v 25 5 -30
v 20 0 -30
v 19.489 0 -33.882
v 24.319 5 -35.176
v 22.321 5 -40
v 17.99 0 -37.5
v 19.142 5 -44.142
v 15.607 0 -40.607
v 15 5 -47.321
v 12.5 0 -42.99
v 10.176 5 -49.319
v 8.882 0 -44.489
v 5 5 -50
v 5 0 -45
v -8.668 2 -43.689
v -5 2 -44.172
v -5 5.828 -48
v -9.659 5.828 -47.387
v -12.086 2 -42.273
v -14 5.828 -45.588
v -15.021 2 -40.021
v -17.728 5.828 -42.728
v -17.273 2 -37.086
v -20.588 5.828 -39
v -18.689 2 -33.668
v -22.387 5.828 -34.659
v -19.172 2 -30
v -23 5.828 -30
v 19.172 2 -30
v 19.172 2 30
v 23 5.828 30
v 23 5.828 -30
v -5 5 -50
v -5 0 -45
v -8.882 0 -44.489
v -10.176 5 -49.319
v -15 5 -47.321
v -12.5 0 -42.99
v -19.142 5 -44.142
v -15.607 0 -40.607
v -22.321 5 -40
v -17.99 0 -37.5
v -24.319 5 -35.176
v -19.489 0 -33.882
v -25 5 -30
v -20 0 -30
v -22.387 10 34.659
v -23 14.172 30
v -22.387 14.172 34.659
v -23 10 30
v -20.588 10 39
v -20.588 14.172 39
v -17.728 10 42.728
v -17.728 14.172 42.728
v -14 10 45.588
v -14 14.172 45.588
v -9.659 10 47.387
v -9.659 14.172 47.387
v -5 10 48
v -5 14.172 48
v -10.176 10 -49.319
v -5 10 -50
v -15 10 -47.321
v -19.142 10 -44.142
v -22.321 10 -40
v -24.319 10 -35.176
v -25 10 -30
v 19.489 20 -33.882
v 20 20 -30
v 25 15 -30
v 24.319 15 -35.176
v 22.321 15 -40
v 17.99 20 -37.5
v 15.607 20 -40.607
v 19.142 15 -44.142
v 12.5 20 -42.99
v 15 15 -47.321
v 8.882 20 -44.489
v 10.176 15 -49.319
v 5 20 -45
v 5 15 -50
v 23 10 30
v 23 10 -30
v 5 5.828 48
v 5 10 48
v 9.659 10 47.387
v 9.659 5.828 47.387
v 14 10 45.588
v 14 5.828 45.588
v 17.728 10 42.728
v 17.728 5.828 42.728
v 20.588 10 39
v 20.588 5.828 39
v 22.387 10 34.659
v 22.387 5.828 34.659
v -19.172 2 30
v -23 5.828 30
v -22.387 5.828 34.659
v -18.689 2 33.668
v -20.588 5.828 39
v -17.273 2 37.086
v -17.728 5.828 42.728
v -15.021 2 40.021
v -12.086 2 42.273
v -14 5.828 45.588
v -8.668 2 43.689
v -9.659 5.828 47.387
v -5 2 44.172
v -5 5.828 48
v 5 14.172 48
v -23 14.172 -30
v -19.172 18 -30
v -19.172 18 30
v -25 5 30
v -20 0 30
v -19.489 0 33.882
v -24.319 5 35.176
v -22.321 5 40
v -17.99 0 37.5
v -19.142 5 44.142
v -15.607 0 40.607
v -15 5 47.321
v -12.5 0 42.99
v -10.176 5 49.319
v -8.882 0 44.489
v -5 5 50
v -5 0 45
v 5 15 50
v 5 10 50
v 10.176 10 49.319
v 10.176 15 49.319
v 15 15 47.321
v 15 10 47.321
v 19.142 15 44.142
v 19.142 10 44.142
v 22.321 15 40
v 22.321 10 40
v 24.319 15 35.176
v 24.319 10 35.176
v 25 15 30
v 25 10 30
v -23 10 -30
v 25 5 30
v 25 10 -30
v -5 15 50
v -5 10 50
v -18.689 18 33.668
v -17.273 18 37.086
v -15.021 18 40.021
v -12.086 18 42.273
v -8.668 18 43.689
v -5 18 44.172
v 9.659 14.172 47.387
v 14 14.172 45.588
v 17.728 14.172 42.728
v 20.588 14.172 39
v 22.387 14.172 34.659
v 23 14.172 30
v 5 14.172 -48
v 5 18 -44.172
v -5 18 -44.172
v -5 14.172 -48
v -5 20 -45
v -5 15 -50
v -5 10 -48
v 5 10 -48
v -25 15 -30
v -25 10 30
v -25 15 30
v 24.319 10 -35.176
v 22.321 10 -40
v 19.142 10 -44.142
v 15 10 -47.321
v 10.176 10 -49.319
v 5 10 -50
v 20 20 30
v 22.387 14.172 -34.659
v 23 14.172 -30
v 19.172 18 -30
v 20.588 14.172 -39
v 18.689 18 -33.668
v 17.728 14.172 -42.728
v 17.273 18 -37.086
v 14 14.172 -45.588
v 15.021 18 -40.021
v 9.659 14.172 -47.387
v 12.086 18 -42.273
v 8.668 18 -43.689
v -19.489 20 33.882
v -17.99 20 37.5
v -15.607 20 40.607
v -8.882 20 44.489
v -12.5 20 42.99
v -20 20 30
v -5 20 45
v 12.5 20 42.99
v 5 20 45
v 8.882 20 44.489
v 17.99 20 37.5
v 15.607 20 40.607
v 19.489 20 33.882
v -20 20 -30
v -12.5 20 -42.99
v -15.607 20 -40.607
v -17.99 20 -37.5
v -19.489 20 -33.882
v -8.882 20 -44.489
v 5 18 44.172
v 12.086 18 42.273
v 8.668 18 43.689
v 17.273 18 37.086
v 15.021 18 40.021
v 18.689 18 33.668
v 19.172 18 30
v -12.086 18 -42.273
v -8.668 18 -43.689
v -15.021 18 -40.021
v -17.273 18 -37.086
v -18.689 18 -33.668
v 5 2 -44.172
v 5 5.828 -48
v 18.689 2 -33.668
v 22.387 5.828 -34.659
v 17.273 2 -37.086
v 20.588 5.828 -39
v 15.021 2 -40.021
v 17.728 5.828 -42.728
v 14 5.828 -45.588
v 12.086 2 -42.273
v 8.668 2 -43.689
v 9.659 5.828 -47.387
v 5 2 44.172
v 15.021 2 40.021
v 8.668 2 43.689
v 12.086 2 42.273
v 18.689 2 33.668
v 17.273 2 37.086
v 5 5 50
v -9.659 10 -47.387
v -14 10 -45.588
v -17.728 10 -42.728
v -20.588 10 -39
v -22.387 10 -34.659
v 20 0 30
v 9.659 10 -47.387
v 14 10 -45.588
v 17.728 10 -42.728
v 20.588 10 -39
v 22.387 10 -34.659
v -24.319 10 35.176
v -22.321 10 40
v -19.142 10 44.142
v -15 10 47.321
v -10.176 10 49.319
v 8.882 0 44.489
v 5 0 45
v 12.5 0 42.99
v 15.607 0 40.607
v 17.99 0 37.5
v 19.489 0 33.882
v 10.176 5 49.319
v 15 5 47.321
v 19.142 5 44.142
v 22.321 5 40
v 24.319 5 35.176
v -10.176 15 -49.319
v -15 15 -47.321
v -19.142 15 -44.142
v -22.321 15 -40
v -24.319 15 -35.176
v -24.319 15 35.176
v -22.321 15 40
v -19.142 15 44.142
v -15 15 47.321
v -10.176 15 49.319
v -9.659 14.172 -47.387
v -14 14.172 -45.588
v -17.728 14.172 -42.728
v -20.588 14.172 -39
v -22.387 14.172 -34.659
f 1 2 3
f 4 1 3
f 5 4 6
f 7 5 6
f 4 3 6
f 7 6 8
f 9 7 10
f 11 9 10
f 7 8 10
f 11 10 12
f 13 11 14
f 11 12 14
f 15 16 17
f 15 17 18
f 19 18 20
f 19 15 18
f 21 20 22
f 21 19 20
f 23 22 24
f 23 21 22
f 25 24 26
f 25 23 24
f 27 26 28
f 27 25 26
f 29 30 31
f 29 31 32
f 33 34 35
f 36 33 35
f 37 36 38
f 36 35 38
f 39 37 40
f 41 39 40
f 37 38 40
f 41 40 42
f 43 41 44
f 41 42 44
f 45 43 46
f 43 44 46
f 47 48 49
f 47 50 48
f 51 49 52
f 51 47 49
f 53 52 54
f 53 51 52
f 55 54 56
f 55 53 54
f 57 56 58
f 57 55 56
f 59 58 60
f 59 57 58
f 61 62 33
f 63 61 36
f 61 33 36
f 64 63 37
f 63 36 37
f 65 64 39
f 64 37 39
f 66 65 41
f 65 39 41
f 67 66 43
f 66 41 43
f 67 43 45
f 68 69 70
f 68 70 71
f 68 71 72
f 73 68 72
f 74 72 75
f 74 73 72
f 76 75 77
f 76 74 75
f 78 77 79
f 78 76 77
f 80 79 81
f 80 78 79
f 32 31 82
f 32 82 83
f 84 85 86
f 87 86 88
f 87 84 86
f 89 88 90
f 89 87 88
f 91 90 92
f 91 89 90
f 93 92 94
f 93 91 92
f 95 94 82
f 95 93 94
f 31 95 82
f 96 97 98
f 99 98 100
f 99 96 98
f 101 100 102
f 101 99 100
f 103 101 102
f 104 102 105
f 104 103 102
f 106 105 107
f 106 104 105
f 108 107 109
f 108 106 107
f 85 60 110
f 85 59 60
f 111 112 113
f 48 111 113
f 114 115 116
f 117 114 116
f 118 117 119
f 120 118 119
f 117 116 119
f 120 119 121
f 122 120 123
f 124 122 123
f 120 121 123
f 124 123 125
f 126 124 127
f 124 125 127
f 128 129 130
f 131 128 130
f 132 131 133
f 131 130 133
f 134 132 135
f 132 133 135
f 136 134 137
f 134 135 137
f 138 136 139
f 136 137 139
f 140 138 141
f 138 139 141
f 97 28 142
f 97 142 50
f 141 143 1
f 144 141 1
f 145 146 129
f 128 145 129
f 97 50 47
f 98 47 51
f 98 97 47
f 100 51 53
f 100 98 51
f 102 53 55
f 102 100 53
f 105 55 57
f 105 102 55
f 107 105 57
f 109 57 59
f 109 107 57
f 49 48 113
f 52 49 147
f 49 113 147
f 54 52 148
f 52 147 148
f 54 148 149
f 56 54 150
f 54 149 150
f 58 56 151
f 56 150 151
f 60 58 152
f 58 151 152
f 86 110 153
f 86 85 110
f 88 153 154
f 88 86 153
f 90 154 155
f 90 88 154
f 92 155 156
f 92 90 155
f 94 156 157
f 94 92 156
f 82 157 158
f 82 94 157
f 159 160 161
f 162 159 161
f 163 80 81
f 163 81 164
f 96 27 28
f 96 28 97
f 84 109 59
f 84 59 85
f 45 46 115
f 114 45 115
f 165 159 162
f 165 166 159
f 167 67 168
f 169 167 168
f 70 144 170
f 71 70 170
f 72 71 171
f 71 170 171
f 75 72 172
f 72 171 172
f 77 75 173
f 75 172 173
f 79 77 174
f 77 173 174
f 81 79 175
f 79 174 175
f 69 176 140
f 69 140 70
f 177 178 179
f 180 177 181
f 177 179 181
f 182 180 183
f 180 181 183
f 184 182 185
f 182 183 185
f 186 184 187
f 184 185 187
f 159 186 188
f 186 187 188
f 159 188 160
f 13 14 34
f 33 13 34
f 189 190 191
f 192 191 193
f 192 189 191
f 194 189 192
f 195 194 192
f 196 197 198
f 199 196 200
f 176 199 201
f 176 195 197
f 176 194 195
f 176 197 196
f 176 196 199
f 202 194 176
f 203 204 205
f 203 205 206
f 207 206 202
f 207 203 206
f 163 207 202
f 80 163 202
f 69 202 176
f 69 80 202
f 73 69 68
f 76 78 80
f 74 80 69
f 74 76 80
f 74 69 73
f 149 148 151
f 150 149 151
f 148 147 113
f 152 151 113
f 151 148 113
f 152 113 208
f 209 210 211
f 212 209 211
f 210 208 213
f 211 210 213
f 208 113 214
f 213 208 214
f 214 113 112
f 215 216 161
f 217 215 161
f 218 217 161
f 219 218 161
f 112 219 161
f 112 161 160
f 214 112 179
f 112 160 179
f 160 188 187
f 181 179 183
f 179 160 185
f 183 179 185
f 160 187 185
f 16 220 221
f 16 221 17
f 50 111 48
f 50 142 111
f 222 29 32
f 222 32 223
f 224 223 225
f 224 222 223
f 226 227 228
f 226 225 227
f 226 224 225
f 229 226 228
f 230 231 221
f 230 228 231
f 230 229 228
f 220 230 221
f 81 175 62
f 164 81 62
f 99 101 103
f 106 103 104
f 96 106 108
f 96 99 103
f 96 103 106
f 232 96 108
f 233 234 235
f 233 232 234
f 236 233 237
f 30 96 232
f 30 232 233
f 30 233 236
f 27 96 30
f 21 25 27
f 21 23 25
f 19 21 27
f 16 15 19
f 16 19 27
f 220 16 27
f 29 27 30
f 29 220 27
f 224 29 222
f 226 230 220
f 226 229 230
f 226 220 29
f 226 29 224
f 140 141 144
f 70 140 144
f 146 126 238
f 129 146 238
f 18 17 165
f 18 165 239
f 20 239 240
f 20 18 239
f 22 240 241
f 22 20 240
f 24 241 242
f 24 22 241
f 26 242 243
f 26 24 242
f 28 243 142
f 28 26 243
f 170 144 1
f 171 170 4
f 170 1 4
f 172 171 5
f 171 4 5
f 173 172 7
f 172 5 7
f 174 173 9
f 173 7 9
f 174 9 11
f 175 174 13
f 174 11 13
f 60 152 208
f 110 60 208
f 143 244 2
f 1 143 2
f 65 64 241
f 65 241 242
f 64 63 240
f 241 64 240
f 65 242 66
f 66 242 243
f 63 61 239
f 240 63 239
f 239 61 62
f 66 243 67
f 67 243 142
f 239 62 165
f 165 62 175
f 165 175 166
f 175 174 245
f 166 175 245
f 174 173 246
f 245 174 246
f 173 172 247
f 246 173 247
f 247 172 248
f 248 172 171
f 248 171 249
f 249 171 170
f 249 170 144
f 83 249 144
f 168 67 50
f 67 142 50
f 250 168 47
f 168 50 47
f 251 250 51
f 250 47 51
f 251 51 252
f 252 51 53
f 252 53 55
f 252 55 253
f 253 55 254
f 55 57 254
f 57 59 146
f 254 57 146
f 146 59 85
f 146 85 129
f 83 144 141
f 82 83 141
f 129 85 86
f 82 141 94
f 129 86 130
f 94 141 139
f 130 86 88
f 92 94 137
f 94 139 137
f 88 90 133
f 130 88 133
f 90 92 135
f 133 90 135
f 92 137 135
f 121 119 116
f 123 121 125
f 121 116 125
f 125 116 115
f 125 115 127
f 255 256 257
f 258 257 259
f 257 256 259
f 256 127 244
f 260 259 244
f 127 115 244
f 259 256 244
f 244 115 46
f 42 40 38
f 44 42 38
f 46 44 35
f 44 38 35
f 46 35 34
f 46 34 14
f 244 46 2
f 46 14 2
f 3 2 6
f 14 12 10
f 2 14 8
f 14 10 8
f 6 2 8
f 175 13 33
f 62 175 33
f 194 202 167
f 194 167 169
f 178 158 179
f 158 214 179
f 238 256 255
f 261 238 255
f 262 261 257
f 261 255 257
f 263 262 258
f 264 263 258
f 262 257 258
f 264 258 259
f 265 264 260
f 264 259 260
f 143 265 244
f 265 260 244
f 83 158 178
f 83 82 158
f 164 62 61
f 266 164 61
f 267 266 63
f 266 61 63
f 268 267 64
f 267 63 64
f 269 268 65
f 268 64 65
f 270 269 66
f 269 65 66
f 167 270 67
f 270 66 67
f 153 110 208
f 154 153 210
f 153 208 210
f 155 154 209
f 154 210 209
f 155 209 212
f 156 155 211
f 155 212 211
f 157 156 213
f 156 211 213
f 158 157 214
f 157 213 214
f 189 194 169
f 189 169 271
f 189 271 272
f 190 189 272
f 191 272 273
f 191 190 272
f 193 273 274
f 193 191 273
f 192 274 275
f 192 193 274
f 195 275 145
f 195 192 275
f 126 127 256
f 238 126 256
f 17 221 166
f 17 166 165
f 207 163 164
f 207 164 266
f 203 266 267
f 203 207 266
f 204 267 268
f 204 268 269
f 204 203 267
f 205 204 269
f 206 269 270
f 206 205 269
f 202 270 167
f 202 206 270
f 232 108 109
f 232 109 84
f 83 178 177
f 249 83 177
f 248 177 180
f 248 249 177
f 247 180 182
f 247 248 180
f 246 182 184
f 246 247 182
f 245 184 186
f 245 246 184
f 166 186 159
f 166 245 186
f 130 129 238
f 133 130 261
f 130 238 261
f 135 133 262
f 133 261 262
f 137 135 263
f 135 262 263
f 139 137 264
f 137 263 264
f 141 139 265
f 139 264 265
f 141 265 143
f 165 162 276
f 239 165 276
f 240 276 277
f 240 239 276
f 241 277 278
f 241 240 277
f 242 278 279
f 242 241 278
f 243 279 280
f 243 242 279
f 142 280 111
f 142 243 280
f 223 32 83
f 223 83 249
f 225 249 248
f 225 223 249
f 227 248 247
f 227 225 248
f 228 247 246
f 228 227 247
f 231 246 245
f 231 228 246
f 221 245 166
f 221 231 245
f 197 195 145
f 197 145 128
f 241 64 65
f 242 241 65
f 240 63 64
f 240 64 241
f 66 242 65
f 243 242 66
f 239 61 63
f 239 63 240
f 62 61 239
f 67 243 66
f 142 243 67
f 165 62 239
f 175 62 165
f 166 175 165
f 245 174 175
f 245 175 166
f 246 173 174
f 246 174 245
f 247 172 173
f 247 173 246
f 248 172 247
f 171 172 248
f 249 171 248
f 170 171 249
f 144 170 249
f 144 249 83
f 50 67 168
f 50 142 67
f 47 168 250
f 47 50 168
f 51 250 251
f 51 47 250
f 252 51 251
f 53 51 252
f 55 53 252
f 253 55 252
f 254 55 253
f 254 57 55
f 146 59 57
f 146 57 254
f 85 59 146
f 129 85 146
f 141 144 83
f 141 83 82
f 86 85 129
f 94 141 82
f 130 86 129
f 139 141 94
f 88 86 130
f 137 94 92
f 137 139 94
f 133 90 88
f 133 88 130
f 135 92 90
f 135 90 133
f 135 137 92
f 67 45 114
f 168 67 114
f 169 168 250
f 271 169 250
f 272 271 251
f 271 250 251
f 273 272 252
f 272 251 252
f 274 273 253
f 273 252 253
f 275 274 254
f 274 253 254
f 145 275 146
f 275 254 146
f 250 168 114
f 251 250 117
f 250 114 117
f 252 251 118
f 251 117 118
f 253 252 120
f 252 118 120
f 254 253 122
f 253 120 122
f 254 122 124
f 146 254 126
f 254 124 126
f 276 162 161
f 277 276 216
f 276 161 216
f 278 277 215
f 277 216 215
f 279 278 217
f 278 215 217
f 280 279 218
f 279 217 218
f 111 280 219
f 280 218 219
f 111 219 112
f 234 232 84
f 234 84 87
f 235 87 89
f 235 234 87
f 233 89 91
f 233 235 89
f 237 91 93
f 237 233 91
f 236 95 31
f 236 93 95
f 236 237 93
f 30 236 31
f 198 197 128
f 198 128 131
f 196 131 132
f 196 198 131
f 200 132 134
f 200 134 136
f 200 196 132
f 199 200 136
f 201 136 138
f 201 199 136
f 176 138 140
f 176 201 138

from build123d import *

# Parameters (mm, degrees)
BOSS_EXTRUDE1_DEPTH = 20
CHAMFER1_SIZE       = 5
SHELL1_T            = -2
SHELL2_T            = -2


with BuildPart() as part:
    # Sketch1 → Boss-Extrude1 (new body)
    with BuildSketch(Plane(origin=(0, 0, 0), x_dir=(1, 0, 0), z_dir=(0, 1, 0))):
        with BuildLine():
            Line((-5, -50), (5, -50))
            ThreePointArc((5, -50), (19.142135624, -44.142135624), (25, -30))
            Line((25, -30), (25, 30))
            ThreePointArc((25, 30), (19.142135624, 44.142135624), (5, 50))
            Line((5, 50), (-5, 50))
            ThreePointArc((-5, 50), (-19.142135624, 44.142135624), (-25, 30))
            Line((-25, 30), (-25, -30))
            ThreePointArc((-25, -30), (-19.142135624, -44.142135624), (-5, -50))
        make_face()
    extrude(amount=BOSS_EXTRUDE1_DEPTH)

    # Chamfer1
    chamfer1_edges = [part.edges().sort_by_distance(p)[0] for p in [
        (25, 0, 0),
        (19.142135624, 0, 44.142135624),
        (0, 0, 50),
        (-19.142135624, 0, 44.142135624),
        (19.142135624, 20, 44.142135624),
        (25, 20, 0),
        (19.142135624, 20, -44.142135624),
        (0, 20, -50),
        (-19.142135624, 20, -44.142135624),
        (-25, 20, 0),
        (-19.142135624, 20, 44.142135624),
        (-25, 0, 0),
        (0, 20, 50),
        (-19.142135624, 0, -44.142135624),
        (0, 0, -50),
        (19.142135624, 0, -44.142135624),
    ]]
    chamfer(chamfer1_edges, length=CHAMFER1_SIZE)


with BuildPart() as body_2:
    # Split1: the piece on the far side of the plane
    add(part.part)
    split(bisect_by=Plane.ZX.offset(10), keep=Keep.BOTTOM)

    # Shell1
    shell1_openings = [body_2.faces().sort_by_distance(p)[0] for p in [
        (0, 10, 0),
    ]]
    offset(amount=SHELL1_T, openings=shell1_openings, kind=Kind.INTERSECTION)


with BuildPart() as part_1:
    add(part.part)

    # Split1
    split(bisect_by=Plane.ZX.offset(10), keep=Keep.TOP)

    # Shell2
    shell2_openings = [part_1.faces().sort_by_distance(p)[0] for p in [
        (0, 10, 0),
    ]]
    offset(amount=SHELL2_T, openings=shell2_openings, kind=Kind.INTERSECTION)


solid = Compound([body_2.part, part_1.part])
